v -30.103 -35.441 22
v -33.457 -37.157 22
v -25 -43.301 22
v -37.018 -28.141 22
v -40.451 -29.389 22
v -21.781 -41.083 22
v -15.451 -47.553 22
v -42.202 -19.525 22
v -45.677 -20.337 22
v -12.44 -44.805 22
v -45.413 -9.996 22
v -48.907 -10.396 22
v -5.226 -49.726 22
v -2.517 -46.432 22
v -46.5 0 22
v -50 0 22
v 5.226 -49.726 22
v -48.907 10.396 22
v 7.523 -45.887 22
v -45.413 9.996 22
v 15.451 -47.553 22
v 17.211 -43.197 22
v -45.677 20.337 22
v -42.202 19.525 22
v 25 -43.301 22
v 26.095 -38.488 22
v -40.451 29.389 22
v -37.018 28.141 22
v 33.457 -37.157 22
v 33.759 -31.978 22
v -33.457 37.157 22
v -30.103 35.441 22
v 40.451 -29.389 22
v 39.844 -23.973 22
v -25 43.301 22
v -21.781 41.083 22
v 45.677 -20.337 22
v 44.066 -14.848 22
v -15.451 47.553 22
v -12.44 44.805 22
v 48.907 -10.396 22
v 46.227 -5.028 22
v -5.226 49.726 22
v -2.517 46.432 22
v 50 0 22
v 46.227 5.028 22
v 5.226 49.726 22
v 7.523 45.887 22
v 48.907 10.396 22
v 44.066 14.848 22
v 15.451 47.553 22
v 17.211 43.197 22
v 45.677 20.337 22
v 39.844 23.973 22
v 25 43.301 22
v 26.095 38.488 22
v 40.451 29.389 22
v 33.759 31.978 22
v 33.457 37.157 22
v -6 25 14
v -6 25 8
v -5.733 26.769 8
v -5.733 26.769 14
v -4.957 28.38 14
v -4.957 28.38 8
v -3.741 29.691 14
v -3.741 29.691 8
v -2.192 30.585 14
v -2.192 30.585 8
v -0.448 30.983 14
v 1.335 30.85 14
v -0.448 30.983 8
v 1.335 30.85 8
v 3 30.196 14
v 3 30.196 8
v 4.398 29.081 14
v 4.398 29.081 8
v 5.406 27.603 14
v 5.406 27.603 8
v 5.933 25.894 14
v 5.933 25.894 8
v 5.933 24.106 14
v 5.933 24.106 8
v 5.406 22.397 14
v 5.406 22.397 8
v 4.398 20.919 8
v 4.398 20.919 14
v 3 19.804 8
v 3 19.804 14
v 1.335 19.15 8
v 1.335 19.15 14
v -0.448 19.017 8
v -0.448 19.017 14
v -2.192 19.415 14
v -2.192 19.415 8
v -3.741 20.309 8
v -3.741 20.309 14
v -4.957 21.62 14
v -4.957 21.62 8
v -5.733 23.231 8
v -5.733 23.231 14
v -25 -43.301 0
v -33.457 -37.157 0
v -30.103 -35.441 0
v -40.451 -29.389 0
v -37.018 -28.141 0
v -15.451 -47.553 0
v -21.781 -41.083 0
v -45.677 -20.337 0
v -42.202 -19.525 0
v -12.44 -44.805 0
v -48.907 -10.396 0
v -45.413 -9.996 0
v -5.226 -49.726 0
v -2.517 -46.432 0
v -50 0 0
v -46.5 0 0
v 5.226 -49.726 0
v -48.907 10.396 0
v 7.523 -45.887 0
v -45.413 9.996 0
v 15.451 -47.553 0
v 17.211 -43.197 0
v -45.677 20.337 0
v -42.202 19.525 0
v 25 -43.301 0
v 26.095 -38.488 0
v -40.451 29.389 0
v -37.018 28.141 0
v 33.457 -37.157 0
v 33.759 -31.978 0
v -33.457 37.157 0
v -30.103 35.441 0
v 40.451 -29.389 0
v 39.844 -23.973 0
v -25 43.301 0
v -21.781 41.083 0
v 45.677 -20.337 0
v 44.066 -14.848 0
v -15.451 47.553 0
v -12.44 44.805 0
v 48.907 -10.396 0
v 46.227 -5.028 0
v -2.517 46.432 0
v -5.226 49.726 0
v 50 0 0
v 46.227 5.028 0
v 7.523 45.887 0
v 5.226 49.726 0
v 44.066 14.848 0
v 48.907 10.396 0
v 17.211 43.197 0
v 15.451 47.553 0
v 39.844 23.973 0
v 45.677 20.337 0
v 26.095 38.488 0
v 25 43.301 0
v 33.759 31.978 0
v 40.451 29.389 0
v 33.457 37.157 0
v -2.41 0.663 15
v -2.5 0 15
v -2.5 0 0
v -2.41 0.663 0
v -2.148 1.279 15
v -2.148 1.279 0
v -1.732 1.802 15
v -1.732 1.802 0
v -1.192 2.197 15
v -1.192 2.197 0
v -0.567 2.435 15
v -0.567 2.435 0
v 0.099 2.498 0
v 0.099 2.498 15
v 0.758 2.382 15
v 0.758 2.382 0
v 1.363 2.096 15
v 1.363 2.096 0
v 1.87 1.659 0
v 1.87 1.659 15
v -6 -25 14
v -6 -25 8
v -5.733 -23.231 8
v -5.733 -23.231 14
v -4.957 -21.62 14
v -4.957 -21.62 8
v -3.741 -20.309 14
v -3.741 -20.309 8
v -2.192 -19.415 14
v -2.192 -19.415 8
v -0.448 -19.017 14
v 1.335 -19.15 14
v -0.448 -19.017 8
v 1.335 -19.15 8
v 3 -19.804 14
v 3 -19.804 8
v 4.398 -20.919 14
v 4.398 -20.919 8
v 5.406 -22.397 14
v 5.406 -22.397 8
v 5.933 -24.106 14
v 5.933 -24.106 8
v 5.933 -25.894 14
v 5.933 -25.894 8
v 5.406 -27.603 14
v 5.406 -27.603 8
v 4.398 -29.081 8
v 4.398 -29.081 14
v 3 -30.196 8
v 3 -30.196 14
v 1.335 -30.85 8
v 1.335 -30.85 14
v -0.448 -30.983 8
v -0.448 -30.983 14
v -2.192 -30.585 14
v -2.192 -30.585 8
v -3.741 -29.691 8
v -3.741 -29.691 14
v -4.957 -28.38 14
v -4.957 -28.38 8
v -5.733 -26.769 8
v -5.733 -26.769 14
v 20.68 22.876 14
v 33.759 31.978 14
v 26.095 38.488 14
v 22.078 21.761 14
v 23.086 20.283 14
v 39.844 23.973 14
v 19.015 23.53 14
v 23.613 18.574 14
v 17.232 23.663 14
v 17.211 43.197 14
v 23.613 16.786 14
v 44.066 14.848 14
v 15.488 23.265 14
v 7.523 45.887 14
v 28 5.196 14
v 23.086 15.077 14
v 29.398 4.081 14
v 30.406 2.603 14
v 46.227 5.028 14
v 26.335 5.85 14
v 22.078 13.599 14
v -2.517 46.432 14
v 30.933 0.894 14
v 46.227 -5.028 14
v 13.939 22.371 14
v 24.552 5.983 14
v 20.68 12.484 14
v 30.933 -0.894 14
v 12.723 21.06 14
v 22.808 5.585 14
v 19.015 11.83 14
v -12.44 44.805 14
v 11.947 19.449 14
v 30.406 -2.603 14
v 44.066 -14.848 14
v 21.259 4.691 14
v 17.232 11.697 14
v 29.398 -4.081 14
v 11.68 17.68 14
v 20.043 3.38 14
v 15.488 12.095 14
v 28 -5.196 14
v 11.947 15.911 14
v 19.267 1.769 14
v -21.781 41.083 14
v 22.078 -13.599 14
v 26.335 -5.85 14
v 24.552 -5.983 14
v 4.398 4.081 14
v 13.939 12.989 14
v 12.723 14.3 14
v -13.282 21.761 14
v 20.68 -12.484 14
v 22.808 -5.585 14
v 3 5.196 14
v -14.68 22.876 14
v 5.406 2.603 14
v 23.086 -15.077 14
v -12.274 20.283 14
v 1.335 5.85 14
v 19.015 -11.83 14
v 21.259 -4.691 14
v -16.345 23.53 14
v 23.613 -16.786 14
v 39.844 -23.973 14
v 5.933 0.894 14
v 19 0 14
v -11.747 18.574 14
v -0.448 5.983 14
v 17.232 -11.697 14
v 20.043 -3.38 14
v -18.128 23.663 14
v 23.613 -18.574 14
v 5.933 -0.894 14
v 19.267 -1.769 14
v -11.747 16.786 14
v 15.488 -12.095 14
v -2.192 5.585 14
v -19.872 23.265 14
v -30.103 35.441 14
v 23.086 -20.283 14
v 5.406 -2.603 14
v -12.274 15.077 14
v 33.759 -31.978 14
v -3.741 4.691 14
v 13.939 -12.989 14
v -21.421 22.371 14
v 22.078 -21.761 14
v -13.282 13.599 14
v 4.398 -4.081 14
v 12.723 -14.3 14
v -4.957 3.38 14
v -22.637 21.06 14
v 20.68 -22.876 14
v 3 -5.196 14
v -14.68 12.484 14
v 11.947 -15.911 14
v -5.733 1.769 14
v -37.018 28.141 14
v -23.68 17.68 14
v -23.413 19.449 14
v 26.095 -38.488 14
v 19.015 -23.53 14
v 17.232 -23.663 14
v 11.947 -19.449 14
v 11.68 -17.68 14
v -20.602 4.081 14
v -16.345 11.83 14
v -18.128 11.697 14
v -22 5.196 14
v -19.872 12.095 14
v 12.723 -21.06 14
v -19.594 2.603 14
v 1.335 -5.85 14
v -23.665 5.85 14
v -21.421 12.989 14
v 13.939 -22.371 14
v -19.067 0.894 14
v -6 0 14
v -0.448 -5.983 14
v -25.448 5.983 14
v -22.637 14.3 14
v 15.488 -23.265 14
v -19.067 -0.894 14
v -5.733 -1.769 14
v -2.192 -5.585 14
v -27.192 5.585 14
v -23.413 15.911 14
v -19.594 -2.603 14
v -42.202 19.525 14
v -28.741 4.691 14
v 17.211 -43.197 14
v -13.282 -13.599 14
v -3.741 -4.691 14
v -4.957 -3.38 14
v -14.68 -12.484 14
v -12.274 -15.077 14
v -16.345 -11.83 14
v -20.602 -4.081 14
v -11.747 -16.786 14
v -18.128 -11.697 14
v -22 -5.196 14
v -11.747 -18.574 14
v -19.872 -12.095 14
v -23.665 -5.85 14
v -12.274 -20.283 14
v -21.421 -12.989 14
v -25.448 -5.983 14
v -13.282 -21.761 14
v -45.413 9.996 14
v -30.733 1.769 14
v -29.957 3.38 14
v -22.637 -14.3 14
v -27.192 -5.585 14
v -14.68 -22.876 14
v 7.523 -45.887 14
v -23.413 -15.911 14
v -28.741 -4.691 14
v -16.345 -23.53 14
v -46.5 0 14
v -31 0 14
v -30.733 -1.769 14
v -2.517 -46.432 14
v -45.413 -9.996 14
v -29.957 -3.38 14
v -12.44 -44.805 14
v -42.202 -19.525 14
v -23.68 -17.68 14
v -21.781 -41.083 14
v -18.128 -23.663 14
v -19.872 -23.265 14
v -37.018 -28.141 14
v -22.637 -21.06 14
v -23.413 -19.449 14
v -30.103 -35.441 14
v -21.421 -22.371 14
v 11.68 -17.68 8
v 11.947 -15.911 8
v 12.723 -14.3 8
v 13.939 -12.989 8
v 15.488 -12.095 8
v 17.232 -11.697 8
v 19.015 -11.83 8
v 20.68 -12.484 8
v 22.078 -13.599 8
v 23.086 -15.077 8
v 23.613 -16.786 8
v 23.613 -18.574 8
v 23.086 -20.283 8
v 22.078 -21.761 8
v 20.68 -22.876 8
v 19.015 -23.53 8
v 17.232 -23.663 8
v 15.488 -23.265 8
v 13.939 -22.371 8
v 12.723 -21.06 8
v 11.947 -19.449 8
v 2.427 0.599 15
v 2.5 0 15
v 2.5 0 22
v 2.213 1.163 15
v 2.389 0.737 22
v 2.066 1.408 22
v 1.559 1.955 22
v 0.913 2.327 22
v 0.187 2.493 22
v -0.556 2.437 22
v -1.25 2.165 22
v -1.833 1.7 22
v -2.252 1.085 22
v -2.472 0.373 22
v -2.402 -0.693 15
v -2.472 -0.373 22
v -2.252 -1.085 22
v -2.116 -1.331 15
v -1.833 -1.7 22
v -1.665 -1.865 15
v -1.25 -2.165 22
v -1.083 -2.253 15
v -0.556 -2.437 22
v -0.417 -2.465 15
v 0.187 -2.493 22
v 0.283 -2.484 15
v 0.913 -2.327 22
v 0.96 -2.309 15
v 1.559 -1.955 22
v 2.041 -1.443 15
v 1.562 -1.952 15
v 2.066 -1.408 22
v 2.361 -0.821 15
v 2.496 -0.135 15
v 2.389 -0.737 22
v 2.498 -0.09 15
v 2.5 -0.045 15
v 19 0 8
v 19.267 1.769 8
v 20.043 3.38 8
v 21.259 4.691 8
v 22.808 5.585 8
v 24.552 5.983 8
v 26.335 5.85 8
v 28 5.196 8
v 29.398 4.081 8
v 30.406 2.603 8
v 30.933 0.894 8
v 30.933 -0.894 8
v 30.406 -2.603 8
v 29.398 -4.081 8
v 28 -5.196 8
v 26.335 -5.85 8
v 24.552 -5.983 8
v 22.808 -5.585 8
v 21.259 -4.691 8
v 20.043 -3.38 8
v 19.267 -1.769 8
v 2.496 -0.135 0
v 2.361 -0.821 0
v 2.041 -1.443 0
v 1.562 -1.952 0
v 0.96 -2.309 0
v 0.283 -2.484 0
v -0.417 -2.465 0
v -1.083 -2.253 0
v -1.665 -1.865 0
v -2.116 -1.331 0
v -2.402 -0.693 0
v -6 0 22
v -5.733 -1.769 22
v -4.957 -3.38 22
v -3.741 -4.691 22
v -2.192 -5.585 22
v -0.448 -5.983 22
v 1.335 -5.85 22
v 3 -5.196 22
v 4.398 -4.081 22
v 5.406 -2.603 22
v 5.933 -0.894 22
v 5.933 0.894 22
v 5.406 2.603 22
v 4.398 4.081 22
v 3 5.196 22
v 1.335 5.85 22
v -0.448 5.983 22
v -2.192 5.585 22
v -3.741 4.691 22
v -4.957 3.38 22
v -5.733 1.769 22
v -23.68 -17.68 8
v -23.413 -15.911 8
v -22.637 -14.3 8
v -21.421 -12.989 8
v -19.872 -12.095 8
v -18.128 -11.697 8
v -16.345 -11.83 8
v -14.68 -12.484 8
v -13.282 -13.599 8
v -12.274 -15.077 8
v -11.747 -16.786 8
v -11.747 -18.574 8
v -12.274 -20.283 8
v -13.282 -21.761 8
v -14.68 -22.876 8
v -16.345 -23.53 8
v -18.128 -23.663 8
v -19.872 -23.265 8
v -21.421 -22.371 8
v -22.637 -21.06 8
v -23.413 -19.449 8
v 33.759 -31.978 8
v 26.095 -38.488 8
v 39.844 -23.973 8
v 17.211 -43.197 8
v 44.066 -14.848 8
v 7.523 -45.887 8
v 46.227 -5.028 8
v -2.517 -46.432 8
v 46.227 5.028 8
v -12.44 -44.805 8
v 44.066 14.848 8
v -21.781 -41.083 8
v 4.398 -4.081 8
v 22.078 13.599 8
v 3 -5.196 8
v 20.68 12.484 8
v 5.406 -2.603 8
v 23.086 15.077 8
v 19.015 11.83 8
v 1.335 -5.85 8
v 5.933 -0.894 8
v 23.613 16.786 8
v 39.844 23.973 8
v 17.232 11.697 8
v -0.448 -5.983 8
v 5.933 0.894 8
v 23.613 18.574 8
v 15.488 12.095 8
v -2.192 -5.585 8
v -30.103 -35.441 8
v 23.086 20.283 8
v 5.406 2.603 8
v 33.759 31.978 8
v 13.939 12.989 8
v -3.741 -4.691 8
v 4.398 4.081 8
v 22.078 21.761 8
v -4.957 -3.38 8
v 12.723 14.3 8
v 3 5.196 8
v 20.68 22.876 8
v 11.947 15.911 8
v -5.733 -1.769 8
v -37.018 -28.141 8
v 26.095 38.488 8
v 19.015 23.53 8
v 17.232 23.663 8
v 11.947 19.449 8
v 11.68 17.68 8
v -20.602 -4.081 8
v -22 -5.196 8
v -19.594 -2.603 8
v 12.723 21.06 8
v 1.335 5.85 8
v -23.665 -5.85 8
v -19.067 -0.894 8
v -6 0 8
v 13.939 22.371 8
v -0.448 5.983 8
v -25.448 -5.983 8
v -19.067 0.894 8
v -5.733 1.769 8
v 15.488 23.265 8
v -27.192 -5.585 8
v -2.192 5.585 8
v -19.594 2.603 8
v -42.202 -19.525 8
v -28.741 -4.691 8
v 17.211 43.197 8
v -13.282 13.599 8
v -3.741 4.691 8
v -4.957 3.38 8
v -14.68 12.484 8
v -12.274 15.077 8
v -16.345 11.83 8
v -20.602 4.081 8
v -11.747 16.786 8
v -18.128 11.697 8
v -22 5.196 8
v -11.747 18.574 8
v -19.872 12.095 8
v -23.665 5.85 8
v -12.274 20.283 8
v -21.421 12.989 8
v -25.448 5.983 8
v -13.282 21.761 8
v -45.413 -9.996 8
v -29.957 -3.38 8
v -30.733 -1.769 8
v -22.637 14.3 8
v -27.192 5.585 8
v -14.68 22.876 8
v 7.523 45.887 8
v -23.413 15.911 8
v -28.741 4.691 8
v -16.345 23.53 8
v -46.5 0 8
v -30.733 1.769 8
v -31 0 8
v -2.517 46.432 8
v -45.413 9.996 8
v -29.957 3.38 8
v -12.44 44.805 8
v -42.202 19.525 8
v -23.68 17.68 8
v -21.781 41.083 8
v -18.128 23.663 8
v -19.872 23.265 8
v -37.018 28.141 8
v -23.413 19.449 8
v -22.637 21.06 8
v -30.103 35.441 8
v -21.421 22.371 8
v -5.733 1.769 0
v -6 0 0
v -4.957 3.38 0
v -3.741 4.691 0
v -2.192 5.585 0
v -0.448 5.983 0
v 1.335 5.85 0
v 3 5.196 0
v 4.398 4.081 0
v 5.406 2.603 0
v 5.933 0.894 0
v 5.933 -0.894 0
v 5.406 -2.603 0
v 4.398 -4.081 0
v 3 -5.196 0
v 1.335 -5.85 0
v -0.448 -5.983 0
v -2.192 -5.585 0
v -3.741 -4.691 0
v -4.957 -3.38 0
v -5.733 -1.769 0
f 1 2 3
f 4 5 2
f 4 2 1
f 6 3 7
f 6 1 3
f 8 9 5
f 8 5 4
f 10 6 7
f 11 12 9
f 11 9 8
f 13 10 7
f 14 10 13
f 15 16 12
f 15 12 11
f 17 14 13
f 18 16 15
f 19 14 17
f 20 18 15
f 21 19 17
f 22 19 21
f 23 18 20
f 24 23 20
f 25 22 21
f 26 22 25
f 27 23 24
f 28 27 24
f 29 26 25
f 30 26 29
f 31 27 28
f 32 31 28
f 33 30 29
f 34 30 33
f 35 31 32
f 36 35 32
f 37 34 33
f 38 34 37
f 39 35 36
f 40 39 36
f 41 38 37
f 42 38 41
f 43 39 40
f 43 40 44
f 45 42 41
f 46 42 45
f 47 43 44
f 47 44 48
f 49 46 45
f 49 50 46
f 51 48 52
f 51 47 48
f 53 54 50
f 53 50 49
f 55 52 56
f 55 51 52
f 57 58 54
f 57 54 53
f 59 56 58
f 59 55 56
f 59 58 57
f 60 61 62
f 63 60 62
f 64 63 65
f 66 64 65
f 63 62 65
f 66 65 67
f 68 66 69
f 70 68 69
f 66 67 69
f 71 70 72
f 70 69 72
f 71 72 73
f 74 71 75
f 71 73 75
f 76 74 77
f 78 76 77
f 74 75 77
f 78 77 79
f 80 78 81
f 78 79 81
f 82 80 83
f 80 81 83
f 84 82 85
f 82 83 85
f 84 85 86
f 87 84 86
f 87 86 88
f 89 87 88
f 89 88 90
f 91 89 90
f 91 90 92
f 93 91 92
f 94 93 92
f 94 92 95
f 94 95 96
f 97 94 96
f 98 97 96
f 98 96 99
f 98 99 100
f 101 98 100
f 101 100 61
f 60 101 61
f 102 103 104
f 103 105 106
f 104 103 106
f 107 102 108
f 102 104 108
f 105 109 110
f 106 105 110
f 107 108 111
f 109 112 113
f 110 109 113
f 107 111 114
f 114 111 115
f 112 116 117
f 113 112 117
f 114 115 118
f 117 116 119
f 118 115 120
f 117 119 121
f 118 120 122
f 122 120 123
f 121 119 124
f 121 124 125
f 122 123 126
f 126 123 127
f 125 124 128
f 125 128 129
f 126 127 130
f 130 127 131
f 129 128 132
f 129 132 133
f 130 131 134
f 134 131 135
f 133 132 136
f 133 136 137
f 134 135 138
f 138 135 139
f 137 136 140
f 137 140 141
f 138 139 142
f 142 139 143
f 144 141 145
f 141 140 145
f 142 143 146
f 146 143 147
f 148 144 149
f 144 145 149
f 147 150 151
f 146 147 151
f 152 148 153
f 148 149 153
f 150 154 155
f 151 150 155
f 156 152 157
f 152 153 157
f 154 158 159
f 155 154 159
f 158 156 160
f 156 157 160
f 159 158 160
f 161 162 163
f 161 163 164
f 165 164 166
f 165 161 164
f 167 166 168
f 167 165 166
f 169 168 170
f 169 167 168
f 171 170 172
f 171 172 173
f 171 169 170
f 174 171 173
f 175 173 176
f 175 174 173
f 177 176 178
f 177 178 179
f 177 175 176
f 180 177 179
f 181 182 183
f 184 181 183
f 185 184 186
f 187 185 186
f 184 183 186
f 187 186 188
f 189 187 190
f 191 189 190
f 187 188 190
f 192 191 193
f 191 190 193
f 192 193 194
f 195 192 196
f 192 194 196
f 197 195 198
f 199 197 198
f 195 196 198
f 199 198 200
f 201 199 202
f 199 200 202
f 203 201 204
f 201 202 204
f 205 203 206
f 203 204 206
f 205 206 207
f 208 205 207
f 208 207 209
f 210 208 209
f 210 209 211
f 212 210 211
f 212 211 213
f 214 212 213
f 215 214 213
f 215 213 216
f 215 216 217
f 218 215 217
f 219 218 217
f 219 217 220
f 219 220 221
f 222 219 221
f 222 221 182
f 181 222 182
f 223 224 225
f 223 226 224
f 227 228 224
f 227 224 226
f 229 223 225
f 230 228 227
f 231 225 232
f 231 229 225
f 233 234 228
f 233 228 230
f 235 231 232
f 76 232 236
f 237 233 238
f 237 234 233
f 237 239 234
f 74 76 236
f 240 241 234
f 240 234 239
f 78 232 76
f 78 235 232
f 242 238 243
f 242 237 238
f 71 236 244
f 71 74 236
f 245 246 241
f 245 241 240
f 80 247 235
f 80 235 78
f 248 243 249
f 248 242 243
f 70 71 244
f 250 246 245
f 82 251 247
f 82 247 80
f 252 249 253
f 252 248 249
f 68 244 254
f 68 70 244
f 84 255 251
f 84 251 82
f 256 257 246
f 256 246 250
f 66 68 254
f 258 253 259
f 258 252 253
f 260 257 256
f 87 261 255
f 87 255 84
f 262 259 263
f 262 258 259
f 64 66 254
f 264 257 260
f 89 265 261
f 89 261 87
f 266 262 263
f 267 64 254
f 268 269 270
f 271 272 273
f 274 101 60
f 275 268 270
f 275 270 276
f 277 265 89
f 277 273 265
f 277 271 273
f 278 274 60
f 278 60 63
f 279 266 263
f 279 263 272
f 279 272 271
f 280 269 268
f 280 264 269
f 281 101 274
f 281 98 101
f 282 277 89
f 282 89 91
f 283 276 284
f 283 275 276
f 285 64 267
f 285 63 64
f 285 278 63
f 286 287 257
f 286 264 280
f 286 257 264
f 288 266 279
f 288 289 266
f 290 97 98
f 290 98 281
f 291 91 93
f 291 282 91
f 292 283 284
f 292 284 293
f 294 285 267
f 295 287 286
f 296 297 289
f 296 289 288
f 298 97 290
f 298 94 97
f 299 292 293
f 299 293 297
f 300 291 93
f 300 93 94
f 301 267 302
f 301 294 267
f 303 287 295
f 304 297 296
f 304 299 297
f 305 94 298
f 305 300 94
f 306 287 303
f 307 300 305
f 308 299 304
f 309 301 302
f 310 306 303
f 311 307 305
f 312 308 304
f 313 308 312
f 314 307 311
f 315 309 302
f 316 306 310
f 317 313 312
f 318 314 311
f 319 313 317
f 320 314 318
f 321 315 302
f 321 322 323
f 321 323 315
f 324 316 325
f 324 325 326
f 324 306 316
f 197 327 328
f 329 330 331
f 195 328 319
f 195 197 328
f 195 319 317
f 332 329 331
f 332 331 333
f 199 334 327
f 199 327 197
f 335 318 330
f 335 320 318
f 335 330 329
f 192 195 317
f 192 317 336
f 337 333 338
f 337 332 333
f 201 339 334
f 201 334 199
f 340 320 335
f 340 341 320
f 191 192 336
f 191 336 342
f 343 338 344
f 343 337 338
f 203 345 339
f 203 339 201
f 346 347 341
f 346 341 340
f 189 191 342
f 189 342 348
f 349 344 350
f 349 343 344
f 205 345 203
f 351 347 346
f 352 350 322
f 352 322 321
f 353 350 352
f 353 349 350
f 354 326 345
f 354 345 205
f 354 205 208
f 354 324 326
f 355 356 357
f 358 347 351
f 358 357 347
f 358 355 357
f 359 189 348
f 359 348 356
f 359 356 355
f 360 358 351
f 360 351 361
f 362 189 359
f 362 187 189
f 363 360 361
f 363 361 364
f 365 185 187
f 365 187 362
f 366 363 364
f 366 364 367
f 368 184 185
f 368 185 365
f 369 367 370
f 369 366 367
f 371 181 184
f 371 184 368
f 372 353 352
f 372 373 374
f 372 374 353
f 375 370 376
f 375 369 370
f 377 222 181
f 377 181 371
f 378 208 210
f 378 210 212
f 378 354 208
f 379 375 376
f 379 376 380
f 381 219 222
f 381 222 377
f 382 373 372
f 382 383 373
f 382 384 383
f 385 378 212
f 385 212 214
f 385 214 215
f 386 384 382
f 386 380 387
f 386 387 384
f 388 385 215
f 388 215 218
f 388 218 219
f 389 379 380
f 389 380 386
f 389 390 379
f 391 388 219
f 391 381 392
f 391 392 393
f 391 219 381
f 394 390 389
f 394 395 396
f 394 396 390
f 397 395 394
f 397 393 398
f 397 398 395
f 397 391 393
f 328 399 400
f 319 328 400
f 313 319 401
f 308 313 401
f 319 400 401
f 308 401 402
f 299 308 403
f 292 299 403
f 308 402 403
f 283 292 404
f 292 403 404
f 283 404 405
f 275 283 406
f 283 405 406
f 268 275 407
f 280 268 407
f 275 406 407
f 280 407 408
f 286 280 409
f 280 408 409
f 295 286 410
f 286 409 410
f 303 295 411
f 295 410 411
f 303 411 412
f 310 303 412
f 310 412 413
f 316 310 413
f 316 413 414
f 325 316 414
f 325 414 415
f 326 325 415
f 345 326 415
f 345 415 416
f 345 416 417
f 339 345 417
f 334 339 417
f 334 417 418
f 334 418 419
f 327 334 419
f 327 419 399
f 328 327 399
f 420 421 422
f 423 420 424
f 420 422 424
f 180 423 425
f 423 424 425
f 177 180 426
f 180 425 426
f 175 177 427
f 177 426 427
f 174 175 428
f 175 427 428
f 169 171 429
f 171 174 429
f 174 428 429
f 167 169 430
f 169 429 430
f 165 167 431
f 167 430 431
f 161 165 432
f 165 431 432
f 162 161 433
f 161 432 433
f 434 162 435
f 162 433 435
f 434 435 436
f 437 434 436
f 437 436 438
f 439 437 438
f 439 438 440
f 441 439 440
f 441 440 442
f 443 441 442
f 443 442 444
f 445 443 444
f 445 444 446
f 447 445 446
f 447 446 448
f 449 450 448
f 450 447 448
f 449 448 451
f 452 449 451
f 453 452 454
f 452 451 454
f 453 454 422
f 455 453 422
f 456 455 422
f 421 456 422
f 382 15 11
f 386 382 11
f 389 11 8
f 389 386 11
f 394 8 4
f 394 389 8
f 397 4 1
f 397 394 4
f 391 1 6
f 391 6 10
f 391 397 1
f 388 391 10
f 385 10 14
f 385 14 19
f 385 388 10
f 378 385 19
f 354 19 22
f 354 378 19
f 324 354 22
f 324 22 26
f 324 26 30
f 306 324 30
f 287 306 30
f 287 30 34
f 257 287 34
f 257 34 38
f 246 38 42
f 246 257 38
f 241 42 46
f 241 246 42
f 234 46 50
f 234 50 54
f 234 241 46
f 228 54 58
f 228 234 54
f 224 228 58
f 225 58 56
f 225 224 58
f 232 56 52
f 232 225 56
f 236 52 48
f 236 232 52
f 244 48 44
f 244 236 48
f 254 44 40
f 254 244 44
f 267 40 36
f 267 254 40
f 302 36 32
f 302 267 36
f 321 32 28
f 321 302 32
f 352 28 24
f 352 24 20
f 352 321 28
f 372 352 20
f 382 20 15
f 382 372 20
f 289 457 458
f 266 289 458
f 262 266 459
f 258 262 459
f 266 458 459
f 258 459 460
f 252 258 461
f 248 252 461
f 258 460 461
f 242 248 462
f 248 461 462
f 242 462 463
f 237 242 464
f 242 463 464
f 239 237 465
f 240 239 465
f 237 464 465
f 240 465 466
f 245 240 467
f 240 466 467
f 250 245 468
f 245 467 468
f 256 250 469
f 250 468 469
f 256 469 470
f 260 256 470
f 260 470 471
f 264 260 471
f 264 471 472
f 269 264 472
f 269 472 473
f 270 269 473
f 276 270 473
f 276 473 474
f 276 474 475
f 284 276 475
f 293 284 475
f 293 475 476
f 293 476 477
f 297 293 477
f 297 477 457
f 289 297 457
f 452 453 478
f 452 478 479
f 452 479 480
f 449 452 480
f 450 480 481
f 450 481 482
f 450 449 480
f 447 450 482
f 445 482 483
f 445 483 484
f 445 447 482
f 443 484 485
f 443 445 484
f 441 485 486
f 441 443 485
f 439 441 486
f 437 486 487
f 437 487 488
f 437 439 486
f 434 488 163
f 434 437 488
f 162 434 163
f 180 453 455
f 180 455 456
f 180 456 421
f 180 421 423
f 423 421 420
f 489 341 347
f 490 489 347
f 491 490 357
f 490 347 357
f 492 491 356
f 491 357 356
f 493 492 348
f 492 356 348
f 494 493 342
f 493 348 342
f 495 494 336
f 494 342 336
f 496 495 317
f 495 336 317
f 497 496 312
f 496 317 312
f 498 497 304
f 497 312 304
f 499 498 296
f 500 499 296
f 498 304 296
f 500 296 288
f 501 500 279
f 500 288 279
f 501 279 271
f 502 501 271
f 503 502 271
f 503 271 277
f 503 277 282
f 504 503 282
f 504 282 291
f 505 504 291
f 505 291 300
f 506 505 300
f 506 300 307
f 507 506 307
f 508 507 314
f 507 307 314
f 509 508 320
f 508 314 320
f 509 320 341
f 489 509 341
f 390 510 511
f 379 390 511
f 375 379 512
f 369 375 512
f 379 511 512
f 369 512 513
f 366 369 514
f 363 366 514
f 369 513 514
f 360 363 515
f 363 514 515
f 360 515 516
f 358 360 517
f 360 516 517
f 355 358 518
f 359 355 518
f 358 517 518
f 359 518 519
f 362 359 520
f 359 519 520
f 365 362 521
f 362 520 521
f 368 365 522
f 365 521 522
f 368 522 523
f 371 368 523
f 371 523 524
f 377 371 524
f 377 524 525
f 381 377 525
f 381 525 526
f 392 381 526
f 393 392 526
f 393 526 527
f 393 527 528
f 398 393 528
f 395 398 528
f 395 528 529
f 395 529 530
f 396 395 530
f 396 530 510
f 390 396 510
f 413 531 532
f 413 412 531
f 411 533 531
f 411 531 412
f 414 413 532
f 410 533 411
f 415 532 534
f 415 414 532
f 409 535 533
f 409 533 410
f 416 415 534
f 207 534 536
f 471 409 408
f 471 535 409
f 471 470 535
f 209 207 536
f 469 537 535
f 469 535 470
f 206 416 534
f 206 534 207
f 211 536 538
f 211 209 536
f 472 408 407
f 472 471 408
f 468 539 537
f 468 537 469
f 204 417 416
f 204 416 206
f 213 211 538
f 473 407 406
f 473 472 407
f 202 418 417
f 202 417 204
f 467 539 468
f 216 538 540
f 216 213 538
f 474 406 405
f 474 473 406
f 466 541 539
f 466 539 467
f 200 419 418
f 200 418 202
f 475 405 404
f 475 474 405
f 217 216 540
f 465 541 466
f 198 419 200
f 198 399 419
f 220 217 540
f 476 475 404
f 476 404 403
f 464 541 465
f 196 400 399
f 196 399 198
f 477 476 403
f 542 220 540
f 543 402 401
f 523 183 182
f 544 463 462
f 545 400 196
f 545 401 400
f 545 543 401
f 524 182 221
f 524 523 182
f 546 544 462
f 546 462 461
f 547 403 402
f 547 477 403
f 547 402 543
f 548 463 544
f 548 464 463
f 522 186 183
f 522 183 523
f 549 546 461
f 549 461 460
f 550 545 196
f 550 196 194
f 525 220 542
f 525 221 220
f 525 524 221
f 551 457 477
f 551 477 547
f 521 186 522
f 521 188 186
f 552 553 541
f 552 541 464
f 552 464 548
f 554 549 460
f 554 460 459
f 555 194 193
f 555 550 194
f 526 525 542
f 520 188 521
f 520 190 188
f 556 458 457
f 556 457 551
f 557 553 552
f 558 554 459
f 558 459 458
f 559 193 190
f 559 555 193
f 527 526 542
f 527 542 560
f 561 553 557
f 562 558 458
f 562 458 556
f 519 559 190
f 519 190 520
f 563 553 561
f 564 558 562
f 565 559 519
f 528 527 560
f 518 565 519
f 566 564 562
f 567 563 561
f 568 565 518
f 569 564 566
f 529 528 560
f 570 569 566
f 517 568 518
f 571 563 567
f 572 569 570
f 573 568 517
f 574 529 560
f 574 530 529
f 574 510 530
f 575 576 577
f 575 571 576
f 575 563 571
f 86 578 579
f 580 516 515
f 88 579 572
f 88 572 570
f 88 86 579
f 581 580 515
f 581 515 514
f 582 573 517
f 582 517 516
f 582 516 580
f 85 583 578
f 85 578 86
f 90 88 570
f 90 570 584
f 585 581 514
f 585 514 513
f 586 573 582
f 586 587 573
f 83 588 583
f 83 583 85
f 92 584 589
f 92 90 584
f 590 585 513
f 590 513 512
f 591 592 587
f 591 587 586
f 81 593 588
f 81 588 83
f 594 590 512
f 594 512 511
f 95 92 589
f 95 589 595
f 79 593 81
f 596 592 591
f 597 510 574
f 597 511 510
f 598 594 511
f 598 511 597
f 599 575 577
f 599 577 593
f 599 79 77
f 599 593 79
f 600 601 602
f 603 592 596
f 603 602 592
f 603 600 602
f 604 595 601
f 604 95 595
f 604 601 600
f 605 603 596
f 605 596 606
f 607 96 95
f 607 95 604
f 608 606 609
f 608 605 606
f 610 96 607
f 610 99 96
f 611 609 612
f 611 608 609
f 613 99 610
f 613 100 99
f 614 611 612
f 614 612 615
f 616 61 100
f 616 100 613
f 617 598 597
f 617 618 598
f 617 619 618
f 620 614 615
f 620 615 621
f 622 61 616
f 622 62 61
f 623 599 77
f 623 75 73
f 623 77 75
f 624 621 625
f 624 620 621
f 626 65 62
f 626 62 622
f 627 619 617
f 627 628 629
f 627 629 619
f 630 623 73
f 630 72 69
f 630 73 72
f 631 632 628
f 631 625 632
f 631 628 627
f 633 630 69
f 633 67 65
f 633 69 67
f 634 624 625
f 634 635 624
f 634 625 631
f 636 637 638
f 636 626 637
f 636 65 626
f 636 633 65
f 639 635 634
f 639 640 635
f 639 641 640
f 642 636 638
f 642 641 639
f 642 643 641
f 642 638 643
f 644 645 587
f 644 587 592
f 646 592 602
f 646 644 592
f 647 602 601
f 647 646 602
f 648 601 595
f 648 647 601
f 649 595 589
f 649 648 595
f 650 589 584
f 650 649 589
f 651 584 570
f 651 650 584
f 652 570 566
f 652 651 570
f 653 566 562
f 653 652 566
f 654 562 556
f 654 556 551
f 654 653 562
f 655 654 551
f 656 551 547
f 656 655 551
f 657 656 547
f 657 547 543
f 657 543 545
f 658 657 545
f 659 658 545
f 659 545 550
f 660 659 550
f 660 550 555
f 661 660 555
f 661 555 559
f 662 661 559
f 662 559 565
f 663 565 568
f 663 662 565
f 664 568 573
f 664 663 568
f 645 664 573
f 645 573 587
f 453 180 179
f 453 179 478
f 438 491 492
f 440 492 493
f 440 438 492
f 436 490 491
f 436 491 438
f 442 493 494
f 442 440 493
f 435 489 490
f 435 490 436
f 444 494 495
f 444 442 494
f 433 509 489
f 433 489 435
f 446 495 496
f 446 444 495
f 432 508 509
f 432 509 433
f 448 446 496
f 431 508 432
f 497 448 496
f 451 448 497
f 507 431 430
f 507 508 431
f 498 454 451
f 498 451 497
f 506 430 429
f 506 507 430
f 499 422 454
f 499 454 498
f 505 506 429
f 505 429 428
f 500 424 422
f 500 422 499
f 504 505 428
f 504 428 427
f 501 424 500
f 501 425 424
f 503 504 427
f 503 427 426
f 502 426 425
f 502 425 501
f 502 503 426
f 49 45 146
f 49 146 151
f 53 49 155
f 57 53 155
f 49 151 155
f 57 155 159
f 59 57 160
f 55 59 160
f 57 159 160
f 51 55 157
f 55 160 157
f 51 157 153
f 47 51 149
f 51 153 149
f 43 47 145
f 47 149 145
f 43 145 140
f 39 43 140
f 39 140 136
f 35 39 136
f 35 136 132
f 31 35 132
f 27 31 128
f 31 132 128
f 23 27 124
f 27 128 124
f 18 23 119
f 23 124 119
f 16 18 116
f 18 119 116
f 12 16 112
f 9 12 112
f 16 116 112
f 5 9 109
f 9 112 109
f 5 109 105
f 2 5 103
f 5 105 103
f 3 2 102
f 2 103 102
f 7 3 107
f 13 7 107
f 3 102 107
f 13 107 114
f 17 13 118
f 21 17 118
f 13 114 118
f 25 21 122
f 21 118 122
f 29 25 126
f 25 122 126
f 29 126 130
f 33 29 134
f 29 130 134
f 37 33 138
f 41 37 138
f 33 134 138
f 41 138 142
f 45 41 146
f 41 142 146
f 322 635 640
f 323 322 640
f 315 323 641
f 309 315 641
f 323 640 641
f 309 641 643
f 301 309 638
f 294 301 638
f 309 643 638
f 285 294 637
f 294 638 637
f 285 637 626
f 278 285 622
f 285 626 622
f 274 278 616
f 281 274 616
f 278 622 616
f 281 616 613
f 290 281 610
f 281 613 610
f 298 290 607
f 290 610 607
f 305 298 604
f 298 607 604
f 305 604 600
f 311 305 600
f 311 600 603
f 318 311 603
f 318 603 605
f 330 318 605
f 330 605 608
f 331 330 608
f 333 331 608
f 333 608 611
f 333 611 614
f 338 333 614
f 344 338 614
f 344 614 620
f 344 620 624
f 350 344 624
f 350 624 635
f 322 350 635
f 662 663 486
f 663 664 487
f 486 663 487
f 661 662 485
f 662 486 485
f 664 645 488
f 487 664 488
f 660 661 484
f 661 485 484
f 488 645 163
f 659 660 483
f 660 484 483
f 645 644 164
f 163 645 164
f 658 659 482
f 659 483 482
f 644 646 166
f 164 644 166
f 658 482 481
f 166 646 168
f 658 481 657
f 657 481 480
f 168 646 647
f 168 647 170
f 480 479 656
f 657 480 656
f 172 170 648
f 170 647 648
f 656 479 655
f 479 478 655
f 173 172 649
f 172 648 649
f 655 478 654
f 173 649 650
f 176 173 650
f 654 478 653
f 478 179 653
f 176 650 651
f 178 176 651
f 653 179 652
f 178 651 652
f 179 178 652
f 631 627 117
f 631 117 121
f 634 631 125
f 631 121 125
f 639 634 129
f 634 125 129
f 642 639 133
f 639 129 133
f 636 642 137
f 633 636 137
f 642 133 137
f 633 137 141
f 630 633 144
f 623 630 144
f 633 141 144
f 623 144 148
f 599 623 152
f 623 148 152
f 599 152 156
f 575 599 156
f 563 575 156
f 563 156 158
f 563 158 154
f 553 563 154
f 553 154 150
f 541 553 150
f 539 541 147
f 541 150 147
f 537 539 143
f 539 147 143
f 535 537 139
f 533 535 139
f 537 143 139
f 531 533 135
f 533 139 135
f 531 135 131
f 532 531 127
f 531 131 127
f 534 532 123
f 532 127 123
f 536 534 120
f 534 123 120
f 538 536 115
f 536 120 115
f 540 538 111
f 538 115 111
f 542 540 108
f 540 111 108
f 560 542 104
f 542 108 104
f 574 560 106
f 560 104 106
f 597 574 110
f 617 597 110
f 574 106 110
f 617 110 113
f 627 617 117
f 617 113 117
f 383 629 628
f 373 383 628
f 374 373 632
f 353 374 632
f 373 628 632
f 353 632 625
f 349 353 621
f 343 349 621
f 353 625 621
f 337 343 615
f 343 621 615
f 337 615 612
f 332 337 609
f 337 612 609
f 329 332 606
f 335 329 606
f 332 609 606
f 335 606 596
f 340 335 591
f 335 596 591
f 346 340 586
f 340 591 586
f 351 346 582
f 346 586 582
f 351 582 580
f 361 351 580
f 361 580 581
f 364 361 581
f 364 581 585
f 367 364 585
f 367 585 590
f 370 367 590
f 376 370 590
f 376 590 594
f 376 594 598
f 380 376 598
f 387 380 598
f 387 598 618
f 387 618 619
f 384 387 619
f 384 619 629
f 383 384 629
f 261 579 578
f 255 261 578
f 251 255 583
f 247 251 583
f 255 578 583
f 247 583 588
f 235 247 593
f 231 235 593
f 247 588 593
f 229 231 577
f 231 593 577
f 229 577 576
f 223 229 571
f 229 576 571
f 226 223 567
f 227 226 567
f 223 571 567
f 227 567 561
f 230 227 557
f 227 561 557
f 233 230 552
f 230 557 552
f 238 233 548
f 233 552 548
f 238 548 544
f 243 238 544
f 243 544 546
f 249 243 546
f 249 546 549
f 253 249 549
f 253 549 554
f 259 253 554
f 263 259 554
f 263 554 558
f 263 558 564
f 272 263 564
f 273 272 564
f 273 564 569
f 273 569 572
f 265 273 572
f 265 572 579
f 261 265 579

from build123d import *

# Parameters (mm, degrees)
ESQUISSE1_R              = 50
BOSS_EXTRU_1_DEPTH       = 22
ESQUISSE2_R              = 2.5
ENL_V_MAT_EXTRU_1_DEPTH  = 7
ENL_V_START              = -15
ENL_V_MAT_EXTRU_2_DEPTH  = 15
ESQUISSE5_R              = 46.5
ESQUISSE5_R_2            = 6
ENL_V_MAT_EXTRU_3_DEPTH  = 8
ENL_V_START_2            = -8
ESQUISSE7_R              = 46.5
ESQUISSE7_R_2            = 6
ENL_V_MAT_EXTRU_4_DEPTH  = 8
ESQUISSE8_R              = 6
ENL_V_MAT_EXTRU_5_DEPTH  = 8
ESQUISSE9_R              = 6
ENL_V_MAT_EXTRU_6_DEPTH  = 8
ESQUISSE10_R             = 6
ENL_V_MAT_EXTRU_7_DEPTH  = 8
ESQUISSE11_R             = 6
ENL_V_MAT_EXTRU_8_DEPTH  = 8
ESQUISSE12_R             = 6
ENL_V_MAT_EXTRU_10_DEPTH = 8
ESQUISSE13_R             = 6
ENL_V_MAT_EXTRU_11_DEPTH = 8
ESQUISSE14_R             = 6
ENL_V_MAT_EXTRU_12_DEPTH = 8
ESQUISSE15_R             = 6
ENL_V_MAT_EXTRU_13_DEPTH = 8


with BuildPart() as part:
    # Esquisse1 → Boss.-Extru.1 (new body)
    with BuildSketch(Plane.XY):
        Circle(ESQUISSE1_R)
    extrude(amount=BOSS_EXTRU_1_DEPTH)

    # Esquisse2 → Enlèv. mat.-Extru.1 (cut)
    with BuildSketch(Plane.XY.offset(22)):
        Circle(ESQUISSE2_R)
    extrude(amount=-ENL_V_MAT_EXTRU_1_DEPTH, mode=Mode.SUBTRACT)

    # Esquisse4 → Enlèv. mat.-Extru.2 (cut)
    with BuildSketch(Plane(origin=(0, 0, 0), x_dir=(-1, 0, 0), z_dir=(0, 0, -1)).offset(ENL_V_START)):
        with BuildLine():
            ThreePointArc((2.5, 0), (0.887540635, 2.337150321), (-1.869817297, 1.659452704))
            Line((-1.869817297, 1.659452704), (-2.496337165, -0.135280301))
            ThreePointArc((-2.496337165, -0.135280301), (0.06766494, -2.499084123), (2.5, 0))
        make_face()
    extrude(amount=ENL_V_MAT_EXTRU_2_DEPTH, mode=Mode.SUBTRACT)

    # Esquisse5 → Enlèv. mat.-Extru.3 (cut)
    with BuildSketch(Plane(origin=(0, 0, 0), x_dir=(-1, 0, 0), z_dir=(0, 0, -1))):
        Circle(ESQUISSE5_R)
        Circle(ESQUISSE5_R_2, mode=Mode.SUBTRACT)
    extrude(amount=-ENL_V_MAT_EXTRU_3_DEPTH, mode=Mode.SUBTRACT)

    # Esquisse7 → Enlèv. mat.-Extru.4 (cut)
    with BuildSketch(Plane.XY.offset(22).offset(ENL_V_START_2)):
        with Locations(Location((0, 0, 0), (0, 0, 180))):
            Circle(ESQUISSE7_R)
        with Locations(Location((0, 0, 0), (0, 0, 180))):
            Circle(ESQUISSE7_R_2, mode=Mode.SUBTRACT)
    extrude(amount=ENL_V_MAT_EXTRU_4_DEPTH, mode=Mode.SUBTRACT)

    # Esquisse8 → Enlèv. mat.-Extru.5 (cut)
    with BuildSketch(Plane(origin=(0, 0, 8), x_dir=(-1, 0, 0), z_dir=(0, 0, -1))):
        with Locations((-25, 0)):
            Circle(ESQUISSE8_R)
    extrude(amount=-ENL_V_MAT_EXTRU_5_DEPTH, mode=Mode.SUBTRACT)

    # Esquisse9 → Enlèv. mat.-Extru.6 (cut)
    with BuildSketch(Plane(origin=(0, 0, 8), x_dir=(-1, 0, 0), z_dir=(0, 0, -1))):
        with Locations((0, 25)):
            Circle(ESQUISSE9_R)
    extrude(amount=-ENL_V_MAT_EXTRU_6_DEPTH, mode=Mode.SUBTRACT)

    # Esquisse10 → Enlèv. mat.-Extru.7 (cut)
    with BuildSketch(Plane(origin=(0, 0, 8), x_dir=(-1, 0, 0), z_dir=(0, 0, -1))):
        with Locations((25, 0)):
            Circle(ESQUISSE10_R)
    extrude(amount=-ENL_V_MAT_EXTRU_7_DEPTH, mode=Mode.SUBTRACT)

    # Esquisse11 → Enlèv. mat.-Extru.8 (cut)
    with BuildSketch(Plane(origin=(0, 0, 8), x_dir=(-1, 0, 0), z_dir=(0, 0, -1))):
        with Locations((0, -25)):
            Circle(ESQUISSE11_R)
    extrude(amount=-ENL_V_MAT_EXTRU_8_DEPTH, mode=Mode.SUBTRACT)

    # Esquisse12 → Enlèv. mat.-Extru.10 (cut)
    with BuildSketch(Plane(origin=(0, 0, 8), x_dir=(-1, 0, 0), z_dir=(0, 0, -1))):
        with Locations((-17.68, 17.68)):
            Circle(ESQUISSE12_R)
    extrude(amount=-ENL_V_MAT_EXTRU_10_DEPTH, mode=Mode.SUBTRACT)

    # Esquisse13 → Enlèv. mat.-Extru.11 (cut)
    with BuildSketch(Plane(origin=(0, 0, 8), x_dir=(-1, 0, 0), z_dir=(0, 0, -1))):
        with Locations((17.68, 17.68)):
            Circle(ESQUISSE13_R)
    extrude(amount=-ENL_V_MAT_EXTRU_11_DEPTH, mode=Mode.SUBTRACT)

    # Esquisse14 → Enlèv. mat.-Extru.12 (cut)
    with BuildSketch(Plane(origin=(0, 0, 8), x_dir=(-1, 0, 0), z_dir=(0, 0, -1))):
        with Locations((-17.68, -17.68)):
            Circle(ESQUISSE14_R)
    extrude(amount=-ENL_V_MAT_EXTRU_12_DEPTH, mode=Mode.SUBTRACT)

    # Esquisse15 → Enlèv. mat.-Extru.13 (cut)
    with BuildSketch(Plane(origin=(0, 0, 8), x_dir=(-1, 0, 0), z_dir=(0, 0, -1))):
        with Locations((17.68, -17.68)):
            Circle(ESQUISSE15_R)
    extrude(amount=-ENL_V_MAT_EXTRU_13_DEPTH, mode=Mode.SUBTRACT)


solid = part.part
